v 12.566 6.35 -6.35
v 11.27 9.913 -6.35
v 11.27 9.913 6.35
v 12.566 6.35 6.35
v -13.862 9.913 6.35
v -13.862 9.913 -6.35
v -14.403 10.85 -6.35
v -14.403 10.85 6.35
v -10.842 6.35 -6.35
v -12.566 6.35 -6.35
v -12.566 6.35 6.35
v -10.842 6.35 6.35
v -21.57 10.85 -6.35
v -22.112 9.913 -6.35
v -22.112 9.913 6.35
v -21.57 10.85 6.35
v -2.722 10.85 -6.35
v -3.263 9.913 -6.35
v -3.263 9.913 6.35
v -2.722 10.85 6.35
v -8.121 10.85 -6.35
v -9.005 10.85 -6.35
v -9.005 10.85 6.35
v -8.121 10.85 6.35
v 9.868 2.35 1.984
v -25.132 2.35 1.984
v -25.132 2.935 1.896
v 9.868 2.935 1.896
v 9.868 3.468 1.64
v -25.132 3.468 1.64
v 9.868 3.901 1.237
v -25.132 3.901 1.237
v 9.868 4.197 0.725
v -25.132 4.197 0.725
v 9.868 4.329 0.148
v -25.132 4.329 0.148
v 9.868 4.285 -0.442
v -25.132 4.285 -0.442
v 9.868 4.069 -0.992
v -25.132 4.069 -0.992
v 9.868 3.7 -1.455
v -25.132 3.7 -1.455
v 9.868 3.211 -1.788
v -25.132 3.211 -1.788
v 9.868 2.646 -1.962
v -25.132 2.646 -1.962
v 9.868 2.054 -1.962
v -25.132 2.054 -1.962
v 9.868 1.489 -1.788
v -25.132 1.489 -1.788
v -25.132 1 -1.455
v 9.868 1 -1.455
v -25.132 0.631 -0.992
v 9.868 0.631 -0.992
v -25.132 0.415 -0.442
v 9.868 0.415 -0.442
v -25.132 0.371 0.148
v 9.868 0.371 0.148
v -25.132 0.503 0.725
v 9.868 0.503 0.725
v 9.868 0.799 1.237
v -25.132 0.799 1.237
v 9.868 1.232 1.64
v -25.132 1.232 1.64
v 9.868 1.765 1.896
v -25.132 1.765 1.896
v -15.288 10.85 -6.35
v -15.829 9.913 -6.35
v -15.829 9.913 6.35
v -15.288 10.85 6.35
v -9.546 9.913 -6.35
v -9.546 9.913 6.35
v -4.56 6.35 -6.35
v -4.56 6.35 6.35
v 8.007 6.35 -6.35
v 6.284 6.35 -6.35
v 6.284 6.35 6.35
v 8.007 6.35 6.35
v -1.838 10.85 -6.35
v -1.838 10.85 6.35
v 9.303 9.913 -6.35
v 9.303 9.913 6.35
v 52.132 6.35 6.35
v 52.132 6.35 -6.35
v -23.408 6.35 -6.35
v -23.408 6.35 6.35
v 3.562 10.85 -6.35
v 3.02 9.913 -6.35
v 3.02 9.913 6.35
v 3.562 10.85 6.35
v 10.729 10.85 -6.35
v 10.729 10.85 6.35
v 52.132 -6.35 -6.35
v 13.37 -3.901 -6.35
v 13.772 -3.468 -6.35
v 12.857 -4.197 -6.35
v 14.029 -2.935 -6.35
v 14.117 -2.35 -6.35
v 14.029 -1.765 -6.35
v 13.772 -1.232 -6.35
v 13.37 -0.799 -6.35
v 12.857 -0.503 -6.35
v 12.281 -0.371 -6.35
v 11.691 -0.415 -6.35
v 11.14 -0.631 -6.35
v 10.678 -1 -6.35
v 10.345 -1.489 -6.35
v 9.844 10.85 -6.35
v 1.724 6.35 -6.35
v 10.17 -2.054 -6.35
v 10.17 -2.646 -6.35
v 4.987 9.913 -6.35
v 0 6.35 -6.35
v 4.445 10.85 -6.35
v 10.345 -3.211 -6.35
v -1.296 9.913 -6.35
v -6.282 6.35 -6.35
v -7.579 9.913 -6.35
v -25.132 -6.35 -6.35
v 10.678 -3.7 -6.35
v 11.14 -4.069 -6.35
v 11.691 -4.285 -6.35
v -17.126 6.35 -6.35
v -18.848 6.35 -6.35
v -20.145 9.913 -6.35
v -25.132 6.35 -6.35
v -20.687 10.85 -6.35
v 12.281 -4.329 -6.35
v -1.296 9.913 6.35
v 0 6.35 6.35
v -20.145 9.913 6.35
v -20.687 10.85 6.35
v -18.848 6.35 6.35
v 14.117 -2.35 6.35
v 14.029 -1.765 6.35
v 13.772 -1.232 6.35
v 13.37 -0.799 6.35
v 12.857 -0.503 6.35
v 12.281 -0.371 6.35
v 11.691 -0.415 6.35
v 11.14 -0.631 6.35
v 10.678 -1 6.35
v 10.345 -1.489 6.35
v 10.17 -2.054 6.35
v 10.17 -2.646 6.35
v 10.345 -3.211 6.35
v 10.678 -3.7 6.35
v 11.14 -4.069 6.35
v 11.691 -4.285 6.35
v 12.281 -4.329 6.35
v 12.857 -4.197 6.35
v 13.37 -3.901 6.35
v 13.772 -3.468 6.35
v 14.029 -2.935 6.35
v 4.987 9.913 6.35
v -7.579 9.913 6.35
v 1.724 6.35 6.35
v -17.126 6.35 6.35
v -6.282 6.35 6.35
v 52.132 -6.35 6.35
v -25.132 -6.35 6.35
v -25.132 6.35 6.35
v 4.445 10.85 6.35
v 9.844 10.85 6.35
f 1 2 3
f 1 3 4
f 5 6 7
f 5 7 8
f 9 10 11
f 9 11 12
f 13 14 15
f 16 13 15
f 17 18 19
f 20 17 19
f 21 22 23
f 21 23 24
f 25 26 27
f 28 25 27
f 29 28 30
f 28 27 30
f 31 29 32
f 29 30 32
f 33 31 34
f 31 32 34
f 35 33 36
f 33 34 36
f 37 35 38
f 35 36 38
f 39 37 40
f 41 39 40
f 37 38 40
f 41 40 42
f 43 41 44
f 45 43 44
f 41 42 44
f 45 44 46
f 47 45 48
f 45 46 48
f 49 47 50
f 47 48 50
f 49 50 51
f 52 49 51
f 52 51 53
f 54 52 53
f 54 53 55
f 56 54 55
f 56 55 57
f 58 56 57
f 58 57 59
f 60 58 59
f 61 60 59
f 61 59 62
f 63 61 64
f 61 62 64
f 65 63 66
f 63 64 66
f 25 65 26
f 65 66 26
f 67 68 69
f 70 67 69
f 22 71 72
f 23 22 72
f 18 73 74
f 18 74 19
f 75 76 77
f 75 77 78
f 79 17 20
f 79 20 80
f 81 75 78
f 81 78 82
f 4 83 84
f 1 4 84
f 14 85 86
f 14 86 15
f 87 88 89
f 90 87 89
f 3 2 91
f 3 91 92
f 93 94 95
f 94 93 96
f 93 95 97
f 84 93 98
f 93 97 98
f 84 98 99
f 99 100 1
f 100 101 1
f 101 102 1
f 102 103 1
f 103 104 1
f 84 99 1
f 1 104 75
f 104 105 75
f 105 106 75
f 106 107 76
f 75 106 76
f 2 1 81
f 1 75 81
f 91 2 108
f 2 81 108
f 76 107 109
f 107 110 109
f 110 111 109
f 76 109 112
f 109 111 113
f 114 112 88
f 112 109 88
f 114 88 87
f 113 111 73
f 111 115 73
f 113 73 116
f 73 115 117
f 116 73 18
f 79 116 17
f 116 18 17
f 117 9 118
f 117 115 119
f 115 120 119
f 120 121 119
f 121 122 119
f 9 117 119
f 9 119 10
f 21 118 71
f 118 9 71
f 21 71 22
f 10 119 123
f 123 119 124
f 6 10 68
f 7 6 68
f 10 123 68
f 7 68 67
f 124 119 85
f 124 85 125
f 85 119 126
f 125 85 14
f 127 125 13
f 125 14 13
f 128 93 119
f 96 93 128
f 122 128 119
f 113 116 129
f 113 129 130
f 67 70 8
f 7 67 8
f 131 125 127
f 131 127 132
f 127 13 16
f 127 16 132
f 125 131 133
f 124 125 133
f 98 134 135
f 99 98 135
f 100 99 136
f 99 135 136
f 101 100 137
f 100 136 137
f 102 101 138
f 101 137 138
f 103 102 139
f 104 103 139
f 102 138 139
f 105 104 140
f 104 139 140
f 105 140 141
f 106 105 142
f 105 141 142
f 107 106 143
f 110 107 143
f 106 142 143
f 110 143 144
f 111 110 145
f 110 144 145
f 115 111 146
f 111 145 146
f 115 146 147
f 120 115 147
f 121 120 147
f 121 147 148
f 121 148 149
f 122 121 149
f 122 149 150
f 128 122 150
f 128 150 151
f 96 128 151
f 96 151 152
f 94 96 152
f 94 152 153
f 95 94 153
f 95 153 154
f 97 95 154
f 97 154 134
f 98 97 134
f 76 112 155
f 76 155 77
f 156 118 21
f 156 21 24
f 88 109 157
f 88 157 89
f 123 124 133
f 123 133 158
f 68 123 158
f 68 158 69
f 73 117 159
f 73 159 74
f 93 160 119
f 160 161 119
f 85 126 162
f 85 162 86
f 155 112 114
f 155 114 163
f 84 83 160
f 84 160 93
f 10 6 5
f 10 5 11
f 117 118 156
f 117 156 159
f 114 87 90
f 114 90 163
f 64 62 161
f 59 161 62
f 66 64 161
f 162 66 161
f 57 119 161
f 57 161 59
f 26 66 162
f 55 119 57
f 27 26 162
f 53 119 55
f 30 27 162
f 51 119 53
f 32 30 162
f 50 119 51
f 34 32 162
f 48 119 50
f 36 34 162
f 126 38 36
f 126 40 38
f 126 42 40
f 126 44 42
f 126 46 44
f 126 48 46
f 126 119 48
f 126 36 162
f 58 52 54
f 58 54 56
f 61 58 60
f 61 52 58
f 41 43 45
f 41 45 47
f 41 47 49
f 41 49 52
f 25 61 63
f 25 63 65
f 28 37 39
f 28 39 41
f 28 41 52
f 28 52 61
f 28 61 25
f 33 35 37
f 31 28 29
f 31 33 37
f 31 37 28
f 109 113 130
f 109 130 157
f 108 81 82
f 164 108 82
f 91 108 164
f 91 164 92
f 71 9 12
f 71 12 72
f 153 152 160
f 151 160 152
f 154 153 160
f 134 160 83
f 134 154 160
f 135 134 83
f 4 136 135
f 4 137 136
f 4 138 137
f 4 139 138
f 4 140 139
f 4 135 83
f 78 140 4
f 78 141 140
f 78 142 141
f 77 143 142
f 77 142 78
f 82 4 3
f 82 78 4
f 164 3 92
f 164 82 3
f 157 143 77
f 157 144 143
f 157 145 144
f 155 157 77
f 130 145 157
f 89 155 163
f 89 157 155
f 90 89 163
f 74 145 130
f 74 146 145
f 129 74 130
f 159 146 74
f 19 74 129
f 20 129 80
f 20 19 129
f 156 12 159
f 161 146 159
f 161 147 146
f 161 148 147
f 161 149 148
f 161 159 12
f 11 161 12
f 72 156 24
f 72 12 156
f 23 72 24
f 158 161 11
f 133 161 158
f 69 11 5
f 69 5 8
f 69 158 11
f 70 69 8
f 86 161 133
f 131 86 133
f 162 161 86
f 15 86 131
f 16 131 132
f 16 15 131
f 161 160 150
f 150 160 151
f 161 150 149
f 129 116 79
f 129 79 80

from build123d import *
from OCP.BRepFilletAPI import BRepFilletAPI_MakeChamfer

# Parameters (mm, degrees)
BOSS_EXTRUDE1_DEPTH      = 6.35
BOSS_EXTRUDE1_DEPTH_BACK = 6.35
SKETCH2_R                = 1.984375
CUT_EXTRUDE1_DEPTH       = 35
CHAMFER1_SIZE            = 0.2
CHAMFER1_SIZE2           = 0.99759701
SKETCH3_W                = 12.7
SKETCH3_H                = 12.7
BOSS_EXTRUDE2_DEPTH      = 27
SKETCH4_R                = 1.984375
CUT_EXTRUDE2_DEPTH       = 55.743127936


with BuildPart() as part:
    # Sketch1 → Boss-Extrude1 (new, two sides: drawn at the far end of the back side and taken through both)
    with BuildSketch(Plane.XY.offset(-BOSS_EXTRUDE1_DEPTH_BACK)):
        Polygon((-23.4085, 6.35), (-21.7705, 10.85), (-20.4865, 10.85), (-18.8485, 6.35), (-17.1255, 6.35), (-15.4875, 10.85), (-14.2035, 10.85), (-12.5655, 6.35), (-10.8425, 6.35), (-9.2045, 10.85), (-7.9205, 10.85), (-6.2825, 6.35), (-4.5595, 6.35), (-2.9215, 10.85), (-1.6375, 10.85), (0.0005, 6.35), (1.7235, 6.35), (3.3615, 10.85), (4.6455, 10.85), (6.2835, 6.35), (8.0065, 6.35), (9.6445, 10.85), (10.9285, 10.85), (12.5665, 6.35), (14.2895, 6.35), (18.8495, 6.35), (20.5725, 6.35), (25.1325, 6.35), (25.1325, -6.35), (-25.1325, -6.35), (-25.1325, 6.35), align=None)
    extrude(amount=BOSS_EXTRUDE1_DEPTH + BOSS_EXTRUDE1_DEPTH_BACK)

    # Sketch2 → Cut-Extrude1 (cut)
    with BuildSketch(Plane.ZY.offset(25.1325)):
        with Locations((0, 2.35)):
            Circle(SKETCH2_R)
    extrude(amount=-CUT_EXTRUDE1_DEPTH, mode=Mode.SUBTRACT)

    # Chamfer1: one chamfer whose edges measure the first distance from different faces: ONE call of the kernel's chamfer builder (chamfer() names one face for all edges)
    chamfer1_edges_1 = [part.edges().sort_by_distance(p)[0] for p in [
        (-21.7705, 10.85, 0),
        (-20.4865, 10.85, 0),
    ]]
    chamfer1_side_1 = [part.faces().sort_by_distance(p)[0] for p in [
        (-21.1285, 10.85, 0),
    ]]
    chamfer1_edges_2 = [part.edges().sort_by_distance(p)[0] for p in [
        (-15.4875, 10.85, 0),
        (-14.2035, 10.85, 0),
    ]]
    chamfer1_side_2 = [part.faces().sort_by_distance(p)[0] for p in [
        (-14.8455, 10.85, 0),
    ]]
    chamfer1_edges_3 = [part.edges().sort_by_distance(p)[0] for p in [
        (-9.2045, 10.85, 0),
        (-7.9205, 10.85, 0),
    ]]
    chamfer1_side_3 = [part.faces().sort_by_distance(p)[0] for p in [
        (-8.5625, 10.85, 0),
    ]]
    chamfer1_edges_4 = [part.edges().sort_by_distance(p)[0] for p in [
        (-2.9215, 10.85, 0),
        (-1.6375, 10.85, 0),
    ]]
    chamfer1_side_4 = [part.faces().sort_by_distance(p)[0] for p in [
        (-2.2795, 10.85, 0),
    ]]
    chamfer1_edges_5 = [part.edges().sort_by_distance(p)[0] for p in [
        (3.3615, 10.85, 0),
        (4.6455, 10.85, 0),
    ]]
    chamfer1_side_5 = [part.faces().sort_by_distance(p)[0] for p in [
        (4.0035, 10.85, 0),
    ]]
    chamfer1_edges_6 = [part.edges().sort_by_distance(p)[0] for p in [
        (9.6445, 10.85, 0),
        (10.9285, 10.85, 0),
    ]]
    chamfer1_side_6 = [part.faces().sort_by_distance(p)[0] for p in [
        (10.2865, 10.85, 0),
    ]]
    chamfer1 = BRepFilletAPI_MakeChamfer(part.part.solid().wrapped)
    for e in chamfer1_edges_1:
        chamfer1.Add(CHAMFER1_SIZE, CHAMFER1_SIZE2, e.wrapped, chamfer1_side_1[0].wrapped)  # the first distance lies on this face
    for e in chamfer1_edges_2:
        chamfer1.Add(CHAMFER1_SIZE, CHAMFER1_SIZE2, e.wrapped, chamfer1_side_2[0].wrapped)  # the first distance lies on this face
    for e in chamfer1_edges_3:
        chamfer1.Add(CHAMFER1_SIZE, CHAMFER1_SIZE2, e.wrapped, chamfer1_side_3[0].wrapped)  # the first distance lies on this face
    for e in chamfer1_edges_4:
        chamfer1.Add(CHAMFER1_SIZE, CHAMFER1_SIZE2, e.wrapped, chamfer1_side_4[0].wrapped)  # the first distance lies on this face
    for e in chamfer1_edges_5:
        chamfer1.Add(CHAMFER1_SIZE, CHAMFER1_SIZE2, e.wrapped, chamfer1_side_5[0].wrapped)  # the first distance lies on this face
    for e in chamfer1_edges_6:
        chamfer1.Add(CHAMFER1_SIZE, CHAMFER1_SIZE2, e.wrapped, chamfer1_side_6[0].wrapped)  # the first distance lies on this face
    add(Compound.cast(chamfer1.Shape()), mode=Mode.REPLACE)

    # Sketch3 → Boss-Extrude2 (add)
    with BuildSketch(Plane(origin=(25.1325, 0, 0), x_dir=(0, 0, -1), z_dir=(1, 0, 0))):
        Rectangle(SKETCH3_W, SKETCH3_H)
    extrude(amount=BOSS_EXTRUDE2_DEPTH)

    # Sketch4 → Cut-Extrude2 (cut, through all)
    with BuildSketch(Plane.XY.offset(6.35)):
        with Locations((12.1325, -2.35)):
            Circle(SKETCH4_R)
    extrude(amount=-CUT_EXTRUDE2_DEPTH, mode=Mode.SUBTRACT)


solid = part.part
